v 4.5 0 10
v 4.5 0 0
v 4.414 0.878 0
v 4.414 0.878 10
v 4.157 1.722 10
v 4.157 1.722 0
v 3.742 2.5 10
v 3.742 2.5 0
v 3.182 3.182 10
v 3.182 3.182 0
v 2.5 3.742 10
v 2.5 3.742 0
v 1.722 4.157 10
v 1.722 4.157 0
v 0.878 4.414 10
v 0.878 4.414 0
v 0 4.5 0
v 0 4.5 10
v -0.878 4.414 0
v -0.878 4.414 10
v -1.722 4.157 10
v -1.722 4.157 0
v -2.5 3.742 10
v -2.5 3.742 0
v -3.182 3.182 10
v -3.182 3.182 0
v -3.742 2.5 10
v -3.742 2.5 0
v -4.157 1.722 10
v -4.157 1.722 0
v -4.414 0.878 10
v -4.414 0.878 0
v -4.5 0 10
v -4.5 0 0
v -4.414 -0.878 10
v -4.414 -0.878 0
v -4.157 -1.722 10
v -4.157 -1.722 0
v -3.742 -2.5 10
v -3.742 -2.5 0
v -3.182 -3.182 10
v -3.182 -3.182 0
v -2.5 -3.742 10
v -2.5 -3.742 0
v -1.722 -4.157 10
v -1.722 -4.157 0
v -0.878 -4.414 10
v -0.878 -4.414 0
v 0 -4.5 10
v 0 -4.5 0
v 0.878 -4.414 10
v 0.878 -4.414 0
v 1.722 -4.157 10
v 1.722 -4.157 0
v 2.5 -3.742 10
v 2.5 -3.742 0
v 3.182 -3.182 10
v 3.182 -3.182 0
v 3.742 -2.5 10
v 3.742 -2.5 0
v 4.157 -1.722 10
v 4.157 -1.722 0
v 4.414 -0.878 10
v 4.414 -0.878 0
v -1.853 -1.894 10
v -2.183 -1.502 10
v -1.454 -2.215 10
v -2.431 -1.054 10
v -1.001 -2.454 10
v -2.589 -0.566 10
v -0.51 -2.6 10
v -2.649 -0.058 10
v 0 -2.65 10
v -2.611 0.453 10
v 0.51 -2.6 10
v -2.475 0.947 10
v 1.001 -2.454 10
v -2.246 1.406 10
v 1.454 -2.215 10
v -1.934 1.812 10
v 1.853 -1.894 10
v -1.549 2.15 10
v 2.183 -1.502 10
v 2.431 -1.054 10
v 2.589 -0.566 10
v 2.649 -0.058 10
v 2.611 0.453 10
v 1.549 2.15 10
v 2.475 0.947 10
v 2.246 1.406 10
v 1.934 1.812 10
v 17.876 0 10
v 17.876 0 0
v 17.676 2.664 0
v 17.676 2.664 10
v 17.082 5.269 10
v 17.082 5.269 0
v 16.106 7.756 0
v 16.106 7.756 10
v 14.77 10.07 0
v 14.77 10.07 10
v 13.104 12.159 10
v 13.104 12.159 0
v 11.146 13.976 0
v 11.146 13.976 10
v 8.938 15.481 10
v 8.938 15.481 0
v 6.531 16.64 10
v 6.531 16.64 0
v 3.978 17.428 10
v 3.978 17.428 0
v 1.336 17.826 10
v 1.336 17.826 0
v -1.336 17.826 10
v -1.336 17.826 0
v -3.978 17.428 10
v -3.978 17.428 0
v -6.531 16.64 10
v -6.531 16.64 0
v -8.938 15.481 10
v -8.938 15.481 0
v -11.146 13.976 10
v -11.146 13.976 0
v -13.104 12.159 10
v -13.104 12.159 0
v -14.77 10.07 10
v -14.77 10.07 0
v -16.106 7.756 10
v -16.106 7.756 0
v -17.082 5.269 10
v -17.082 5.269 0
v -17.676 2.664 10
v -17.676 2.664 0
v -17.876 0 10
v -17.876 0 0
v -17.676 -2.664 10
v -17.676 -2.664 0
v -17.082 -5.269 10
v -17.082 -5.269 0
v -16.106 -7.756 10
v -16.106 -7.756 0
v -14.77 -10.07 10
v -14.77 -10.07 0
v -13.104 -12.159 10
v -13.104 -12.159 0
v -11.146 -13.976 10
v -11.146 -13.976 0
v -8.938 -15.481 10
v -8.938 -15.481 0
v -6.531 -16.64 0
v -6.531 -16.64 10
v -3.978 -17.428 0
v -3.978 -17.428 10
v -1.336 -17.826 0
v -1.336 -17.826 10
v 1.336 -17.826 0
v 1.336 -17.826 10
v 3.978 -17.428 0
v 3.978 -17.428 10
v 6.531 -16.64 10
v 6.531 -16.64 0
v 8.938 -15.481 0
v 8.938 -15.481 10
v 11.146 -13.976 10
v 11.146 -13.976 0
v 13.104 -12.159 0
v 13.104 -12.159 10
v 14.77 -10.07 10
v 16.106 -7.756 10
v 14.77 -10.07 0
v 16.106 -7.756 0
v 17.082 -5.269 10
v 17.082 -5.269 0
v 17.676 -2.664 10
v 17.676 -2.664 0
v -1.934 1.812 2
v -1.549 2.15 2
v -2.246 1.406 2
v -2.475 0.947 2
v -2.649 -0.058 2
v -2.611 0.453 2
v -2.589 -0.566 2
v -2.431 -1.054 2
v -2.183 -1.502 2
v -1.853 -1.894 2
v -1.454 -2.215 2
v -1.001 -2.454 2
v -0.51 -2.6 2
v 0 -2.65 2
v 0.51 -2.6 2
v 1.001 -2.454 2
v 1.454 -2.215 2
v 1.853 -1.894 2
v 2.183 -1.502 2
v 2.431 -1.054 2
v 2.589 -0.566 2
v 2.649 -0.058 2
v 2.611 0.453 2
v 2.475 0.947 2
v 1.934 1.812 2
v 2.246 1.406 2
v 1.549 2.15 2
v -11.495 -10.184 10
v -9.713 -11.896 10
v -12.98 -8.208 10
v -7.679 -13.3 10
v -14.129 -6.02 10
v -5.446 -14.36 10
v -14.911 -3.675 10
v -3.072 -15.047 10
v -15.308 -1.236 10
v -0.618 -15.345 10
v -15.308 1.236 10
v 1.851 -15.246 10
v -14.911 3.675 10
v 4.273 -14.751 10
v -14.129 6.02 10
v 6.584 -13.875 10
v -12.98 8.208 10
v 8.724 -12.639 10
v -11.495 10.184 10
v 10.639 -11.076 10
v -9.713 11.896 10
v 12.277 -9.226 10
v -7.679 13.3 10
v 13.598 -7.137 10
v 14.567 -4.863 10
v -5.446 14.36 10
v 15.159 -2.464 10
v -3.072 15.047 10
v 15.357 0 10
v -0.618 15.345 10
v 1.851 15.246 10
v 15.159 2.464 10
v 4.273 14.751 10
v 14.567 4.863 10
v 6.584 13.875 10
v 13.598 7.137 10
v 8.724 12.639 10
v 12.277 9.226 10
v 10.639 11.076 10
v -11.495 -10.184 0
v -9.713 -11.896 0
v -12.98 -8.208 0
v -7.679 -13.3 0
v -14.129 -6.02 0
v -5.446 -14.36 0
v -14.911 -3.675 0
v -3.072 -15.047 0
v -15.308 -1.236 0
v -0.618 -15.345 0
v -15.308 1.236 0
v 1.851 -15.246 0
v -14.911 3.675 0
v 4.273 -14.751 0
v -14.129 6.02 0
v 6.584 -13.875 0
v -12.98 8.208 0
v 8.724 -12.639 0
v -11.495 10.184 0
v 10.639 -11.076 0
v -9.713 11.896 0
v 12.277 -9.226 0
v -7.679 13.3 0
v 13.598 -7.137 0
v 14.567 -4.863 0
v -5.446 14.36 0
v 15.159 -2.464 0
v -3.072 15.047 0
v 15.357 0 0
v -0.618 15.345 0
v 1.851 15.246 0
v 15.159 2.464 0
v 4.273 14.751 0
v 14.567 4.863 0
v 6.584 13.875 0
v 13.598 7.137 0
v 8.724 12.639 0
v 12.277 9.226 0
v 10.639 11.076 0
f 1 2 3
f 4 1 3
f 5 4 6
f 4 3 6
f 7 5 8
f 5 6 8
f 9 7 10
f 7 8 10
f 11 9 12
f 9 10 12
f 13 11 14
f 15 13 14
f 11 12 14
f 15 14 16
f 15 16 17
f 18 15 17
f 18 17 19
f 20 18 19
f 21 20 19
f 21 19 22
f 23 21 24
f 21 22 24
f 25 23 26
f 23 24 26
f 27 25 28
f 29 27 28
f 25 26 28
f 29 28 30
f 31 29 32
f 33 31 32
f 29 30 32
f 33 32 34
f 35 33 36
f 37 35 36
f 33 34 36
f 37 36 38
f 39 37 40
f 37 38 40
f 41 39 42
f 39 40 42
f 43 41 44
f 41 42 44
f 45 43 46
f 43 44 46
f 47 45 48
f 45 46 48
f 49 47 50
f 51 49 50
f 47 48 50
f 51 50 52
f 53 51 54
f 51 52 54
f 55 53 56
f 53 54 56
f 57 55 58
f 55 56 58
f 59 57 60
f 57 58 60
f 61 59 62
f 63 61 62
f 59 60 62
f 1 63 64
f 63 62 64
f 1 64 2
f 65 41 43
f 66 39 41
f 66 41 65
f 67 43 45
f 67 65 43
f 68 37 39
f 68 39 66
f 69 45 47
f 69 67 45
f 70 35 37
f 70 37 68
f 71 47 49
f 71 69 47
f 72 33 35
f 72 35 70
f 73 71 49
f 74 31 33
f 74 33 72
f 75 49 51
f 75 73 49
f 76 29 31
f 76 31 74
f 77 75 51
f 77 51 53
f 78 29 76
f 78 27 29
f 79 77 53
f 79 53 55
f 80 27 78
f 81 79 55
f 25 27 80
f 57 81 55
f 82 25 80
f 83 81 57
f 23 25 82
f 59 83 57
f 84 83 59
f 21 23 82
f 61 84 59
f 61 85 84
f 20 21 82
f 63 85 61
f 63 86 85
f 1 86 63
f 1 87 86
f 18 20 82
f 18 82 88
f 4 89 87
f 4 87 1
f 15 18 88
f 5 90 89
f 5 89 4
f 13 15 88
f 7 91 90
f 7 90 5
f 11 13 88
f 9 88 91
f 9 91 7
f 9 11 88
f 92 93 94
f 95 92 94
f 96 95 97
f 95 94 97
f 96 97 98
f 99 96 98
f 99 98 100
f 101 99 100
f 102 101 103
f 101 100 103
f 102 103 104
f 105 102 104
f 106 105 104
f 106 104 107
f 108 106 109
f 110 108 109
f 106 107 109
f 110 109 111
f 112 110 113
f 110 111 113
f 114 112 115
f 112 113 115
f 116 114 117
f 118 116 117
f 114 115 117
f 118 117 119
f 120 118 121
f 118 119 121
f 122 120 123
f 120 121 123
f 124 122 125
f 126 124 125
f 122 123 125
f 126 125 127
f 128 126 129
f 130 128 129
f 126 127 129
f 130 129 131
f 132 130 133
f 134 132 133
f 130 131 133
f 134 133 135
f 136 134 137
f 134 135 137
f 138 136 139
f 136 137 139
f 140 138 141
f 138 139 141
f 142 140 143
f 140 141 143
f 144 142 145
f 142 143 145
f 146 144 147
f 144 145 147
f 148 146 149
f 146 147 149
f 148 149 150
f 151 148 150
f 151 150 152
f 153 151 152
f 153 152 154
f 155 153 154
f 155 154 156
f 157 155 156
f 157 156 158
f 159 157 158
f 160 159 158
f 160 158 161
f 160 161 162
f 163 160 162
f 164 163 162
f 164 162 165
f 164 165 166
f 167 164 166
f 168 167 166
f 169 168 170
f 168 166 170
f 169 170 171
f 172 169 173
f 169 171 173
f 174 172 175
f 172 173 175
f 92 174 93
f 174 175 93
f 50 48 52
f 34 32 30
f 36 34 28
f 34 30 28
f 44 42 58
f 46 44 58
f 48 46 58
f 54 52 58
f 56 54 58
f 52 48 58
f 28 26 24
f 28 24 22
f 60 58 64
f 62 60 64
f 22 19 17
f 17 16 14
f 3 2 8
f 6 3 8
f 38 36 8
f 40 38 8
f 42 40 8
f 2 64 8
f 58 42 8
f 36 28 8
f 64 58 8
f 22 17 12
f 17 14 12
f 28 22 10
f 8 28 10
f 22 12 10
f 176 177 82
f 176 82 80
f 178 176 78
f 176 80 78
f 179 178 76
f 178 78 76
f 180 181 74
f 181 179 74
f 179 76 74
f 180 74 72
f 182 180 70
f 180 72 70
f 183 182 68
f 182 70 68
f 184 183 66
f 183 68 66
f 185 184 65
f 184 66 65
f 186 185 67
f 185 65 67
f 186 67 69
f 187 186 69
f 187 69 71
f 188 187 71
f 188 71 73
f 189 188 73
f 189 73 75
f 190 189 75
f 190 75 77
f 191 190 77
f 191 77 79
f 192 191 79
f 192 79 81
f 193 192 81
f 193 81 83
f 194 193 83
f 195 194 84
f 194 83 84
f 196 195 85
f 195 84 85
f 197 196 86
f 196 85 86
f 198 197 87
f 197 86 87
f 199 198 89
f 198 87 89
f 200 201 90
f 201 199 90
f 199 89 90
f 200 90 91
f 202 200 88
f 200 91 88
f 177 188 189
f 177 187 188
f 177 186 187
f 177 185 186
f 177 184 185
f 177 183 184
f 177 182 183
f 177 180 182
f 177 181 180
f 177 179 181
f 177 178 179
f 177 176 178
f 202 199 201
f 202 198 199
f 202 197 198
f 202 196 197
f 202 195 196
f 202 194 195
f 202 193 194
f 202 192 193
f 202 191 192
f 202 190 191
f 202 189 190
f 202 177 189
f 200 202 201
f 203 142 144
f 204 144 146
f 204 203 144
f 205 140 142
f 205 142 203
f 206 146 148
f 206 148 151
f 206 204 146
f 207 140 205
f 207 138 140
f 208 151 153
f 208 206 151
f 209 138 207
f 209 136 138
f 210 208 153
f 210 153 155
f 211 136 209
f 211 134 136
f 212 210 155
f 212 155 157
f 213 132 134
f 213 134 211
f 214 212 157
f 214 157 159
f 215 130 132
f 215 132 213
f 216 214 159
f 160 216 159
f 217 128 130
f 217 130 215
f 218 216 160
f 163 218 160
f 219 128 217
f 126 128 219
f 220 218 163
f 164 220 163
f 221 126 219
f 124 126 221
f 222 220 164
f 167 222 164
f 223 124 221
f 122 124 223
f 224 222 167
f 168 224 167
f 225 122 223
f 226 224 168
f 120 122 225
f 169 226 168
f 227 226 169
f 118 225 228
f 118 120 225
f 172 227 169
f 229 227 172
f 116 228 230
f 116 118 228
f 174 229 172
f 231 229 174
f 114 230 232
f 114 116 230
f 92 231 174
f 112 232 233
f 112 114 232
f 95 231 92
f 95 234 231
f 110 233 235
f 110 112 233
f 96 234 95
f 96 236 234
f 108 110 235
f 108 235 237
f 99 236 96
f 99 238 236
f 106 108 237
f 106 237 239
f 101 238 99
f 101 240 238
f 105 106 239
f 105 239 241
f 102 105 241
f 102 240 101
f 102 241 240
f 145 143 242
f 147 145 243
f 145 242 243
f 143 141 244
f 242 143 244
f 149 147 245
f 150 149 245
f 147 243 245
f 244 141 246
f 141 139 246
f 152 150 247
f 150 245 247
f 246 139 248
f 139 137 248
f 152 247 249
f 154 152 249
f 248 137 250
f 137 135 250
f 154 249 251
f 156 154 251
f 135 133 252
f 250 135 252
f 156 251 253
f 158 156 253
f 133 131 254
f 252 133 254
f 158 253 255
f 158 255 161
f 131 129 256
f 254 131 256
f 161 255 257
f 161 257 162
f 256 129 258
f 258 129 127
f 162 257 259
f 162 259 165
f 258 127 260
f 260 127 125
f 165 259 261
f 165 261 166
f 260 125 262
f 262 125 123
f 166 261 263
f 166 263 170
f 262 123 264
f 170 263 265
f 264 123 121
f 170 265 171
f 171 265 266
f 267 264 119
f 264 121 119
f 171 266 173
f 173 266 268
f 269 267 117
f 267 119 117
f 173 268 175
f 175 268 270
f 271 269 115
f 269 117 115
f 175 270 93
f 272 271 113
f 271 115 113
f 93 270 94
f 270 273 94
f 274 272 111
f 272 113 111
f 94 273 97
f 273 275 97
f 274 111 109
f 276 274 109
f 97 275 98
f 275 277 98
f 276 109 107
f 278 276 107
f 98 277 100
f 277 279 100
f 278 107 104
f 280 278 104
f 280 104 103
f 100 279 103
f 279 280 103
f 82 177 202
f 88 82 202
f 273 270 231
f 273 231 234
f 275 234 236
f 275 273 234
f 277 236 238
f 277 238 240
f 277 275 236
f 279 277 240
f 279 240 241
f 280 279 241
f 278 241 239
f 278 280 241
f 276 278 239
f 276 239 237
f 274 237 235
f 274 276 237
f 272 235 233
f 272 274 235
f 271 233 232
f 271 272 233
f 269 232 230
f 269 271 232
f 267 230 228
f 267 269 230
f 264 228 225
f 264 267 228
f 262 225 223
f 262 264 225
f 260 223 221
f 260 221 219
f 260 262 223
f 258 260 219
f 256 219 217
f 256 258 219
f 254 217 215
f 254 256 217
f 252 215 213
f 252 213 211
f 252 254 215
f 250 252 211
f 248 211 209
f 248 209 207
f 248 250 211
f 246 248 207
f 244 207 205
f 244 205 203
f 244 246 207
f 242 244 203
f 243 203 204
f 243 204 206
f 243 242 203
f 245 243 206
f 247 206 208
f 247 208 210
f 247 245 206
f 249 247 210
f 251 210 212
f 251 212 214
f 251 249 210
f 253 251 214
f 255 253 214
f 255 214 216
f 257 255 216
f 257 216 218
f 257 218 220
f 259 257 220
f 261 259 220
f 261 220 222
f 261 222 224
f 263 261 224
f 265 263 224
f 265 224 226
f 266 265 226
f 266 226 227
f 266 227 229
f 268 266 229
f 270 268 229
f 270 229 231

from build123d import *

# Parameters (mm, degrees)
F0_R     = 4.5
F1_DEPTH = 10
F2_R     = 2.65
F3_DEPTH = 8
F5_DEPTH = 8
F6_R     = 17.876008
F6_R_2   = 15.357495
F7_DEPTH = 10


with BuildPart() as f1:
    # F0 (on Top) → F1 (new body)
    with BuildSketch(Plane.XY):
        Circle(F0_R)
    extrude(amount=F1_DEPTH)

    # F2 (on face) → F3 (cut)
    with BuildSketch(Plane.XY.offset(10)):
        Circle(F2_R)
    extrude(amount=-F3_DEPTH, mode=Mode.SUBTRACT)

    # F4 (on face) → F5 (join, through all)
    with BuildSketch(Plane.XY.offset(2)):
        with BuildLine():
            ThreePointArc((1.549193, 2.15), (0, 2.65), (-1.549193, 2.15))
            Line((-1.549193, 2.15), (1.549193, 2.15))
        make_face()
    extrude(amount=F5_DEPTH)


with BuildPart() as f7:
    # F6 (on Top) → F7 (new body, through all)
    with BuildSketch(Plane.XY):
        Circle(F6_R)
        Circle(F6_R_2, mode=Mode.SUBTRACT)
    extrude(amount=F7_DEPTH)


solid = Compound([f1.part, f7.part])
